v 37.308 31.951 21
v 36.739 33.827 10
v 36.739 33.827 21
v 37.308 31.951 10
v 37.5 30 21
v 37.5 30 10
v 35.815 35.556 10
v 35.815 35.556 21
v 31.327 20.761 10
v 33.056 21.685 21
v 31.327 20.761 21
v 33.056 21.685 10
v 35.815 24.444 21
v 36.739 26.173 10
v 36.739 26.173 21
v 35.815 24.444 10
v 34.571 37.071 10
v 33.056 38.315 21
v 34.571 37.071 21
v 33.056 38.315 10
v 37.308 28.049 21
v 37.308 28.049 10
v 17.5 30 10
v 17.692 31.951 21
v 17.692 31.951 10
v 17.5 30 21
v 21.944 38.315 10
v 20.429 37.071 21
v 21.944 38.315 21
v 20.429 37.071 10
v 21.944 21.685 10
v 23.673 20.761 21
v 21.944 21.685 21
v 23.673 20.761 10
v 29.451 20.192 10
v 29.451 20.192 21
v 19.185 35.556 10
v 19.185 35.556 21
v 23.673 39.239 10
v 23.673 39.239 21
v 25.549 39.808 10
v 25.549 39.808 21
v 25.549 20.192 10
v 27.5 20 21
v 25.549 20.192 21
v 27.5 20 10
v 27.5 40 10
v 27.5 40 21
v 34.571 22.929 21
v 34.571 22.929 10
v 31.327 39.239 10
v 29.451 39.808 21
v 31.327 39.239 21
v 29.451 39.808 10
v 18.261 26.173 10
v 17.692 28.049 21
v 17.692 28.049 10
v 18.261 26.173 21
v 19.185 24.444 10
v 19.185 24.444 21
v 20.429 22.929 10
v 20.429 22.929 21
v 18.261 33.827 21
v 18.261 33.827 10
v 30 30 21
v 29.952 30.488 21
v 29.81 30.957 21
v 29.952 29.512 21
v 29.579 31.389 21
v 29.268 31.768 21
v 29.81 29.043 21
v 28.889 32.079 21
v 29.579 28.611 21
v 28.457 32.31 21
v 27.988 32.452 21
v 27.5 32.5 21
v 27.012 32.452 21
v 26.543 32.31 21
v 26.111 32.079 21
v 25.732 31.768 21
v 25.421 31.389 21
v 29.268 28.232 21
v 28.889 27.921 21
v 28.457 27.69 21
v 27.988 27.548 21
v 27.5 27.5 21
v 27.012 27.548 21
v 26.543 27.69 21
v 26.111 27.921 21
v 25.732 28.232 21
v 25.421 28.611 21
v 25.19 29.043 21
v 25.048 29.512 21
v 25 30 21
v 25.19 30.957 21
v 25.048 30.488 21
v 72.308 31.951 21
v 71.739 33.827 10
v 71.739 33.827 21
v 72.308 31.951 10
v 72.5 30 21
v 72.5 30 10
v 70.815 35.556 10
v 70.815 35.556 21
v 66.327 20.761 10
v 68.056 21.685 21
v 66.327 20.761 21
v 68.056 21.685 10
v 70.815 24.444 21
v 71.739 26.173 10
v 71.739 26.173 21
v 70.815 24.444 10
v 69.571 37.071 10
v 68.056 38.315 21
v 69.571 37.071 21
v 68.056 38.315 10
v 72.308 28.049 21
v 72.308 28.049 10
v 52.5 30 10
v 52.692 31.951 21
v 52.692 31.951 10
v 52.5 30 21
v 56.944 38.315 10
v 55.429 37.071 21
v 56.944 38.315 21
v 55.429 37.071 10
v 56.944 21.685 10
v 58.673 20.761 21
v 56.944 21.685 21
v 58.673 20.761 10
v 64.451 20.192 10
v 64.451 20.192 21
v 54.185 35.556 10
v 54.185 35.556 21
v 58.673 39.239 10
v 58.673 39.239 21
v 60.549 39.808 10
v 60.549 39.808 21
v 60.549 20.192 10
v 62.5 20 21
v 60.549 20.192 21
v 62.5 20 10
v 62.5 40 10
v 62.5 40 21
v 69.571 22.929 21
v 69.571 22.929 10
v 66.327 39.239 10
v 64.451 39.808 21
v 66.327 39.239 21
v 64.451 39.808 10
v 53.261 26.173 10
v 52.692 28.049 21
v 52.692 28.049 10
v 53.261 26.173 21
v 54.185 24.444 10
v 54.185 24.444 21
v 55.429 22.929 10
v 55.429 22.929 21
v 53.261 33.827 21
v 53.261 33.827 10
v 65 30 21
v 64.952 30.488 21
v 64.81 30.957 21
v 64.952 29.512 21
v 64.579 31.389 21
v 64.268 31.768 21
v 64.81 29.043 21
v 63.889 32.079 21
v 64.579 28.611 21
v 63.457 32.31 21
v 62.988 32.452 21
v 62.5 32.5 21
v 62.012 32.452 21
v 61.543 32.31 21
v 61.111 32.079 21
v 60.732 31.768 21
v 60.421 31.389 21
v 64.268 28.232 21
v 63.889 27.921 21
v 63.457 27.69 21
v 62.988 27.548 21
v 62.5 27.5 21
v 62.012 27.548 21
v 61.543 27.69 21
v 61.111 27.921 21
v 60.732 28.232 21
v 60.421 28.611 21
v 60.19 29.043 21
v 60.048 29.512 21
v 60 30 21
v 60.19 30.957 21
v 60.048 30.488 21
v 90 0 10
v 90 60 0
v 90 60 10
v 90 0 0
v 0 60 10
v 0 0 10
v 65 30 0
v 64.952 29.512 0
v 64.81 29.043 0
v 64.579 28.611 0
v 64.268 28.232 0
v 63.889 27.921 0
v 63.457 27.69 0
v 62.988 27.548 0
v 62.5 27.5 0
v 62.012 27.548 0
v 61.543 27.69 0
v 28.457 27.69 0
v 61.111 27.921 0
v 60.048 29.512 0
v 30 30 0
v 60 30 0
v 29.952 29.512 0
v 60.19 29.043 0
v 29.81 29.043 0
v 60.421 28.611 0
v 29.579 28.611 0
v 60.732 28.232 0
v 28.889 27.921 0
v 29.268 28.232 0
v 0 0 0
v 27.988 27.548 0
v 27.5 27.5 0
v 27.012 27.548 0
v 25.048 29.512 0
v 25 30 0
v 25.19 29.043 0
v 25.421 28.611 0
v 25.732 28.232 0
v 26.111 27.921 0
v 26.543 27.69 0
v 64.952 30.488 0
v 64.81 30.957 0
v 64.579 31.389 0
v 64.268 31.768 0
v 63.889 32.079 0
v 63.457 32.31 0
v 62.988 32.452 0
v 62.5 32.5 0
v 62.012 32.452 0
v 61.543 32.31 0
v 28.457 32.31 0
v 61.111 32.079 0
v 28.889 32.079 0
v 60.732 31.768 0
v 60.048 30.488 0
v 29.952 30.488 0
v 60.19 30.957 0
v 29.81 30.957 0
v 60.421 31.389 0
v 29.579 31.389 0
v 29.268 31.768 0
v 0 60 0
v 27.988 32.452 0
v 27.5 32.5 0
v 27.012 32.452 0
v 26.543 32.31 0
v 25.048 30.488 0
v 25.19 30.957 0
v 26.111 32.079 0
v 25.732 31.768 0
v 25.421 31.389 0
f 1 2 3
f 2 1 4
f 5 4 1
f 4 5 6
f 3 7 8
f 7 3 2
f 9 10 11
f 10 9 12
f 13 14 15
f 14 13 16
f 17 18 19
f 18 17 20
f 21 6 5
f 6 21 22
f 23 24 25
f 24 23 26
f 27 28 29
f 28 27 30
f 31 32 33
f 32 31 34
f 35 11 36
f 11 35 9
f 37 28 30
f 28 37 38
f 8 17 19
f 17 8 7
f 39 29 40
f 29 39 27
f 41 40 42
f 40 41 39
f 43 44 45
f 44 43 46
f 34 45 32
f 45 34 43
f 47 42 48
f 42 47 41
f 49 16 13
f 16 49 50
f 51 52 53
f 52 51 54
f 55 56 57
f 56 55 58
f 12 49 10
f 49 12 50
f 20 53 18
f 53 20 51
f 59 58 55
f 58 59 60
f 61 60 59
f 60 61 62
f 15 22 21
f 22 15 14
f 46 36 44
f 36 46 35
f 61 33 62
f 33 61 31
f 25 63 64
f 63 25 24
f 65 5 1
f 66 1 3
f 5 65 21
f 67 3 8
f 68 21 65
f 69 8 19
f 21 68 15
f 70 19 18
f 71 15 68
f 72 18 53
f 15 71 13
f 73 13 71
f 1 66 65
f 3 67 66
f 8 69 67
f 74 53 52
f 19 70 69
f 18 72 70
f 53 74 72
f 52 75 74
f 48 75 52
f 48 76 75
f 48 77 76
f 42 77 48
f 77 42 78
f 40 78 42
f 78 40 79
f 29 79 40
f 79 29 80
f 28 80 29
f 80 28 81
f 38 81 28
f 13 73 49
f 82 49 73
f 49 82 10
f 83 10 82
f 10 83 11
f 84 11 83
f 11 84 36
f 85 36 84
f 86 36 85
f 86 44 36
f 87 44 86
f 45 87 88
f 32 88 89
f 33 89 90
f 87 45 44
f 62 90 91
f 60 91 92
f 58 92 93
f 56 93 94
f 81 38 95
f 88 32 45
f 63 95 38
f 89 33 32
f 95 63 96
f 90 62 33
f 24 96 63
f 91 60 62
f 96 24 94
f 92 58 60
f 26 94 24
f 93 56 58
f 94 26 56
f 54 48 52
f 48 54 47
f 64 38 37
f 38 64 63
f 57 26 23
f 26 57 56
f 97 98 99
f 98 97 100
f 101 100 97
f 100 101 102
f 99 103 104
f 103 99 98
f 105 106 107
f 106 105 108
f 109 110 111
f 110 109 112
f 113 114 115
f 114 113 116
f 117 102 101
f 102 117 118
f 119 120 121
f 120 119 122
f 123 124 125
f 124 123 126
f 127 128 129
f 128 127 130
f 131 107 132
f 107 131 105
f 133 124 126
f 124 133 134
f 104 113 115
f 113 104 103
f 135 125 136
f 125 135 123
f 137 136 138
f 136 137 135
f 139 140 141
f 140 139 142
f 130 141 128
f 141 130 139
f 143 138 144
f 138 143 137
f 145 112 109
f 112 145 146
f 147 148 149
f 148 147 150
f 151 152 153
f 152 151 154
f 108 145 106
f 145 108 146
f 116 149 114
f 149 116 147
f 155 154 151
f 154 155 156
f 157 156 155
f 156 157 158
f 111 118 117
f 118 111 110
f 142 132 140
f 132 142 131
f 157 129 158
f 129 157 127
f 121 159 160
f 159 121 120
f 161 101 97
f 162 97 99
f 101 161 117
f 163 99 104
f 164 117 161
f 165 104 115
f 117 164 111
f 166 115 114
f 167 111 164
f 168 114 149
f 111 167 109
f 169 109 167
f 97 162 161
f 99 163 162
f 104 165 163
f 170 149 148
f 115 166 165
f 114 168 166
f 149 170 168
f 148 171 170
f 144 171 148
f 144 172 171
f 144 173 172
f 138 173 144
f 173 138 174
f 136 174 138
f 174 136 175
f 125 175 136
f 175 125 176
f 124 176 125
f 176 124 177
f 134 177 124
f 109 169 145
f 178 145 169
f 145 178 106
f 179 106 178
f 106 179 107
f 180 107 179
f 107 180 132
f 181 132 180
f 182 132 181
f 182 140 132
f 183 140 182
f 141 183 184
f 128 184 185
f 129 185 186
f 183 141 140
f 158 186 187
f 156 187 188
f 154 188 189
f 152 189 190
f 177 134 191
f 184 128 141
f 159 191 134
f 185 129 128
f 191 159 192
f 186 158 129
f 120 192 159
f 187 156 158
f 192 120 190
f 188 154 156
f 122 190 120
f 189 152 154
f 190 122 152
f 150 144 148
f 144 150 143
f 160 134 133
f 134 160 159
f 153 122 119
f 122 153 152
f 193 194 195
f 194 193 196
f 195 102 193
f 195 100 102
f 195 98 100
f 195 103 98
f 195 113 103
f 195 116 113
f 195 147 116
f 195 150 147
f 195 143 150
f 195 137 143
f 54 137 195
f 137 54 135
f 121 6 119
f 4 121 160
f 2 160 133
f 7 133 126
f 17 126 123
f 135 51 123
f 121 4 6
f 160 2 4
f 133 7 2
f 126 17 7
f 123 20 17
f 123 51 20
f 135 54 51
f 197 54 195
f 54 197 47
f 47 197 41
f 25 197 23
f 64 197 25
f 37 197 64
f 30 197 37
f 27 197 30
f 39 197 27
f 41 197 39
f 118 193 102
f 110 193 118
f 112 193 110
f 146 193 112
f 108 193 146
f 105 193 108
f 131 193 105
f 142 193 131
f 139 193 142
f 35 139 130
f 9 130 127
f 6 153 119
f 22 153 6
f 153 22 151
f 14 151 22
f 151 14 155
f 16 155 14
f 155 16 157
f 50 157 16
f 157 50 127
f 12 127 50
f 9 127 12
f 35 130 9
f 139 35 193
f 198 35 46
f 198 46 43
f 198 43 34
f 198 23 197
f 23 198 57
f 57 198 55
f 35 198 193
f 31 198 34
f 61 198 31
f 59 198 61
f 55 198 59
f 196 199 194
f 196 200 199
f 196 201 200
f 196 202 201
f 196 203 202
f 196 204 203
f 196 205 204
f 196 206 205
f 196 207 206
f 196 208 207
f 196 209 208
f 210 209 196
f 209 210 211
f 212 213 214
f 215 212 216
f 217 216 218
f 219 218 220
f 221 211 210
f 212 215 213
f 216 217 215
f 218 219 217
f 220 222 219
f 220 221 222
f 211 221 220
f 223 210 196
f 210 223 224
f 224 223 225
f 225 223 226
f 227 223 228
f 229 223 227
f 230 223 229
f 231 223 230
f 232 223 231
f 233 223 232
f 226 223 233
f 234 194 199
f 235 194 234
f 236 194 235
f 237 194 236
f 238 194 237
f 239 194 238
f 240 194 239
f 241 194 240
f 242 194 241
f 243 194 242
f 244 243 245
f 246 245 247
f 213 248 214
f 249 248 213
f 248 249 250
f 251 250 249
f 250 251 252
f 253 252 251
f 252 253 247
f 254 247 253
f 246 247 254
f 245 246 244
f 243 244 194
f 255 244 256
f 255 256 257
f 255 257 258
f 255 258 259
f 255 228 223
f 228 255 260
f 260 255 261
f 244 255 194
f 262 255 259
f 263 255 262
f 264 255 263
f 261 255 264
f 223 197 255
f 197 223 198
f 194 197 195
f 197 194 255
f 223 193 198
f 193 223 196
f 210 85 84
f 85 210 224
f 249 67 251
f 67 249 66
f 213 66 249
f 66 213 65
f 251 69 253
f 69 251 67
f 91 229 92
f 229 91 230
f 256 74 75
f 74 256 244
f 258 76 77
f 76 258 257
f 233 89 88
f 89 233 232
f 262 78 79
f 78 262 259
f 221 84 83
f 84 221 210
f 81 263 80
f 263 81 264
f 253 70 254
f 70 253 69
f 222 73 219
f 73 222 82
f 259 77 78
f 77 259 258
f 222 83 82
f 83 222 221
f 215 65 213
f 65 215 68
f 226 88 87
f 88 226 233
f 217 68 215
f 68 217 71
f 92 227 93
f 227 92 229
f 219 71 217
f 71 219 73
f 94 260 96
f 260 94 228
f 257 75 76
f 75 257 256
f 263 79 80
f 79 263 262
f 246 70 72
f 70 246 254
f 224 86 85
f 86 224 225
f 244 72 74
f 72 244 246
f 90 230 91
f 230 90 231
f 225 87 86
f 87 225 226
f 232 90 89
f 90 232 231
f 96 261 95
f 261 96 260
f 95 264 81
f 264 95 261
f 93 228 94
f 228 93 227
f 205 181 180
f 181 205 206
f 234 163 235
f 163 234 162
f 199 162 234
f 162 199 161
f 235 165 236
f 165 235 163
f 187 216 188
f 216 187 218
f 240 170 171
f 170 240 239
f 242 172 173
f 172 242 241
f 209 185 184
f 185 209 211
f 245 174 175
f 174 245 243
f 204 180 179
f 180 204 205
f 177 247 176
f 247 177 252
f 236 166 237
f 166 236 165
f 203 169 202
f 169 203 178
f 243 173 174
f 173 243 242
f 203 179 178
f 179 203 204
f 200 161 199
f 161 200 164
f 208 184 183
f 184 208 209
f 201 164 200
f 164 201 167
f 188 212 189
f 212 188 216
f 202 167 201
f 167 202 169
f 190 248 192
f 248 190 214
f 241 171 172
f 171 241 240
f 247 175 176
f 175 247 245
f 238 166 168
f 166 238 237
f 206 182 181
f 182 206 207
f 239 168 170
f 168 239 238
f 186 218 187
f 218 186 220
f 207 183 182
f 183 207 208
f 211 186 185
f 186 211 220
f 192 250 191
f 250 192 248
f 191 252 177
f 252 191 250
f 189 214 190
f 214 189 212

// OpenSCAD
$fn = 32;

// ----------------------------------------------------------------------
// Drill jig: two_boss jig
// ----------------------------------------------------------------------

// --- parameters (mm) ---
plate_l = 90;             // plate length, X
plate_w = 60;             // plate width, Y
plate_t = 10;             // plate thickness
boss_d = 20;              // guide boss diameter
boss_h = 12;              // boss height above the plate
guide_d = 5;              // guide hole diameter
boss_pitch = 35;          // boss pitch

n_boss = 2;  // guide bosses
boss_x0 = (plate_l - (n_boss - 1) * boss_pitch) / 2;  // first boss X
boss_top = plate_t - 1 + boss_h;  // boss crown height
total_h = boss_top;  // overall height

difference() {
  union() {
  cube([plate_l, plate_w, plate_t]);
  for (i = [0 : n_boss - 1])
    translate([boss_x0 + i * boss_pitch, plate_w / 2, plate_t - 1])
      cylinder(h = boss_h, d = boss_d);
  }
  for (i = [0 : n_boss - 1])
    translate([boss_x0 + i * boss_pitch, plate_w / 2, -1])
      cylinder(h = plate_t + boss_h, d = guide_d);
}
